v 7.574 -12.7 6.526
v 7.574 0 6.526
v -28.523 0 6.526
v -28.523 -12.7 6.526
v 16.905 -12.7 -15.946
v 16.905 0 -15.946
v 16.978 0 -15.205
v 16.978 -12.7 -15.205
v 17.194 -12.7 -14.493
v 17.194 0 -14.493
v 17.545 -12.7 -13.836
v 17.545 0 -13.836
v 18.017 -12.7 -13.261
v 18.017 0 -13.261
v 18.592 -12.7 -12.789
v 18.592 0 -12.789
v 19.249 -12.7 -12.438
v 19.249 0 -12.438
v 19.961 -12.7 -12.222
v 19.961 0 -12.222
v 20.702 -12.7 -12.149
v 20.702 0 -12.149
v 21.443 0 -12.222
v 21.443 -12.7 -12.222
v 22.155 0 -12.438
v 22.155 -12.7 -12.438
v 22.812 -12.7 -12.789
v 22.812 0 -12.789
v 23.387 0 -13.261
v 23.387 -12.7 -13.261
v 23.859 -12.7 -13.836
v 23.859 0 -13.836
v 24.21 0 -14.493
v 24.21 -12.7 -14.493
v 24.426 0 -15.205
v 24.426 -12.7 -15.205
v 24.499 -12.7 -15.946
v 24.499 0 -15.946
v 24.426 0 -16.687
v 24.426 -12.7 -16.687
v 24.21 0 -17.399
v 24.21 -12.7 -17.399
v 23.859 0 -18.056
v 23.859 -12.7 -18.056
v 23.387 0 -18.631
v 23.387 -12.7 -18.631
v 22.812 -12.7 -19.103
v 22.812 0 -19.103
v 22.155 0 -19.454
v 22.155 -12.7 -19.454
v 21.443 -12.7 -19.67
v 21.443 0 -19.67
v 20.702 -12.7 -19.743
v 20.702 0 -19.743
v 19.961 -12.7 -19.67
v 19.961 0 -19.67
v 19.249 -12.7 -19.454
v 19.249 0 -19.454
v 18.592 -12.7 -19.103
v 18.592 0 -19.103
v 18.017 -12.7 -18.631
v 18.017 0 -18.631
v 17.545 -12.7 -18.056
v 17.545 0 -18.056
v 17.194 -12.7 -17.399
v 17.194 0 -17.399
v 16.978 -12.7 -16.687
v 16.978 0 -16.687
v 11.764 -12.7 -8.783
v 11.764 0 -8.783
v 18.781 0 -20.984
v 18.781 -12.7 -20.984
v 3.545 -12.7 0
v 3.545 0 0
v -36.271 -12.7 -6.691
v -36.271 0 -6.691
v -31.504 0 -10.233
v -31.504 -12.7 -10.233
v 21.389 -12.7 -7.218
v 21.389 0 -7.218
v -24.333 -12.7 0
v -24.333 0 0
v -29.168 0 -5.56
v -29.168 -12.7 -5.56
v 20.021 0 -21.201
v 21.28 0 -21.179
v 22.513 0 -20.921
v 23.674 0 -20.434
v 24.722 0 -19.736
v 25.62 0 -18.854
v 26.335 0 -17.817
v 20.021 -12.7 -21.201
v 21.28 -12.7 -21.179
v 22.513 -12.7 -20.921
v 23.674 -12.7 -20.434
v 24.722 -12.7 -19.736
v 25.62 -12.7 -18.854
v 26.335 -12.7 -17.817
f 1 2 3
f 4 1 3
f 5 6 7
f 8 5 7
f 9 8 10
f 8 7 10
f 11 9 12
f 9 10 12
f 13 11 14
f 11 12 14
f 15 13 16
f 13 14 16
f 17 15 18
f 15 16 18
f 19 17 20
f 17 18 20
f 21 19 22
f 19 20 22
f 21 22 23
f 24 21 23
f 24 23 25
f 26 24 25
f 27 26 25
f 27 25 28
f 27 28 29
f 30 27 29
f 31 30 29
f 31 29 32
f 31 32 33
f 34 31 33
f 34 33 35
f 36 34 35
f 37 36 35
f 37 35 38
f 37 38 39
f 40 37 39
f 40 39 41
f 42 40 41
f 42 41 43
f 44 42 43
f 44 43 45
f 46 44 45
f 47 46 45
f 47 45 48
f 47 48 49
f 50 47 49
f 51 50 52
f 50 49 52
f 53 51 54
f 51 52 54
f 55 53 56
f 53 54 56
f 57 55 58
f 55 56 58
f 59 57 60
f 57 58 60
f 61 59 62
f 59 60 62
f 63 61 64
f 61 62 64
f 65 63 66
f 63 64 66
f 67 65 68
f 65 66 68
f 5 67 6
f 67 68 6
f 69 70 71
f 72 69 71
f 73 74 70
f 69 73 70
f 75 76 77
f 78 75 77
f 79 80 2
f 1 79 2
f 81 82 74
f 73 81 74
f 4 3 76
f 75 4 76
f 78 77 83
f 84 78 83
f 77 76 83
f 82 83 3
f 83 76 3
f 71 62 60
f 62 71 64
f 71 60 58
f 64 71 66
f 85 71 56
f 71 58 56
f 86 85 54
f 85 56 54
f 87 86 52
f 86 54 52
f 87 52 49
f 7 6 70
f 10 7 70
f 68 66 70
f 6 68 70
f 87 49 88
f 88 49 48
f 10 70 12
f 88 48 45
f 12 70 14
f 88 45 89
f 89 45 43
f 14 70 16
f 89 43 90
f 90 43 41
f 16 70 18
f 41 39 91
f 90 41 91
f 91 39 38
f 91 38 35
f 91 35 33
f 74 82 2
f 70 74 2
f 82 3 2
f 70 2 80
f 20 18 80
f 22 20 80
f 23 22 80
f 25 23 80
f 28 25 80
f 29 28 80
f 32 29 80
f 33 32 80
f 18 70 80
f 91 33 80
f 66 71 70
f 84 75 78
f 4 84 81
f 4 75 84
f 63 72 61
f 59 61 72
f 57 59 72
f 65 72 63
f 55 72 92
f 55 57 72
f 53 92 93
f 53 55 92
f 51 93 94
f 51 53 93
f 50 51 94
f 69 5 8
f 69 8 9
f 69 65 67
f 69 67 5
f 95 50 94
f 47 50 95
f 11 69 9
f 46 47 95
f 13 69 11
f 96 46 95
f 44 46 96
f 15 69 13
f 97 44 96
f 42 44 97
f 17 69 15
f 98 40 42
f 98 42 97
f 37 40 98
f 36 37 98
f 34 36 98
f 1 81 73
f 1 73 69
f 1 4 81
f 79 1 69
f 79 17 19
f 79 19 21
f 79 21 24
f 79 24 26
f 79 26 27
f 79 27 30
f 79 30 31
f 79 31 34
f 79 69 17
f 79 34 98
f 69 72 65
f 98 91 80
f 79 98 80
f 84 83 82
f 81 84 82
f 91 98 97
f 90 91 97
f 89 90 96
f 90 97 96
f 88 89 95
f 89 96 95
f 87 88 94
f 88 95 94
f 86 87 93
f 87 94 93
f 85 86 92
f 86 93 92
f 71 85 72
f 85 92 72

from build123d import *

# Parameters (mm, degrees)
F1_DEPTH = 12.7
F3_D     = 7.5946
F5_DEPTH = 25.4


with BuildPart() as f1:
    # F0 (on Front) → F1 (new body)
    with BuildSketch(Plane.XZ):
        Polygon((-29.167796, -5.559607), (-24.333354, 0), (3.545257, 0), (11.763807, -8.782567), (18.78079, -20.983703), (21.036864, -25.818144), (22.326047, -25.818144), (27.099216, -19.453921), (21.389281, -7.218347), (7.573958, 6.526496), (-28.523203, 6.526496), (-36.271484, -6.691031), (-31.504442, -10.2329), align=None)
    extrude(amount=F1_DEPTH)

    # F3 (through all)
    with Locations(Plane.XZ.offset(12.7)):
        with Locations((20.701887, -15.946049)):
            Hole(F3_D / 2)

    # F4 (on face) → F5 (cut)
    with BuildSketch(Plane.XZ.offset(12.7)):
        with BuildLine():
            ThreePointArc((26.33537, -17.817108), (23.104833, -20.704799), (18.78079, -20.983703))
            Line((18.78079, -20.983703), (21.036864, -25.818144))
            Line((21.036864, -25.818144), (22.326047, -25.818144))
            Line((22.326047, -25.818144), (27.099216, -19.453921))
            Line((27.099216, -19.453921), (26.33537, -17.817108))
        make_face()
    extrude(amount=-F5_DEPTH, mode=Mode.SUBTRACT)


solid = f1.part
